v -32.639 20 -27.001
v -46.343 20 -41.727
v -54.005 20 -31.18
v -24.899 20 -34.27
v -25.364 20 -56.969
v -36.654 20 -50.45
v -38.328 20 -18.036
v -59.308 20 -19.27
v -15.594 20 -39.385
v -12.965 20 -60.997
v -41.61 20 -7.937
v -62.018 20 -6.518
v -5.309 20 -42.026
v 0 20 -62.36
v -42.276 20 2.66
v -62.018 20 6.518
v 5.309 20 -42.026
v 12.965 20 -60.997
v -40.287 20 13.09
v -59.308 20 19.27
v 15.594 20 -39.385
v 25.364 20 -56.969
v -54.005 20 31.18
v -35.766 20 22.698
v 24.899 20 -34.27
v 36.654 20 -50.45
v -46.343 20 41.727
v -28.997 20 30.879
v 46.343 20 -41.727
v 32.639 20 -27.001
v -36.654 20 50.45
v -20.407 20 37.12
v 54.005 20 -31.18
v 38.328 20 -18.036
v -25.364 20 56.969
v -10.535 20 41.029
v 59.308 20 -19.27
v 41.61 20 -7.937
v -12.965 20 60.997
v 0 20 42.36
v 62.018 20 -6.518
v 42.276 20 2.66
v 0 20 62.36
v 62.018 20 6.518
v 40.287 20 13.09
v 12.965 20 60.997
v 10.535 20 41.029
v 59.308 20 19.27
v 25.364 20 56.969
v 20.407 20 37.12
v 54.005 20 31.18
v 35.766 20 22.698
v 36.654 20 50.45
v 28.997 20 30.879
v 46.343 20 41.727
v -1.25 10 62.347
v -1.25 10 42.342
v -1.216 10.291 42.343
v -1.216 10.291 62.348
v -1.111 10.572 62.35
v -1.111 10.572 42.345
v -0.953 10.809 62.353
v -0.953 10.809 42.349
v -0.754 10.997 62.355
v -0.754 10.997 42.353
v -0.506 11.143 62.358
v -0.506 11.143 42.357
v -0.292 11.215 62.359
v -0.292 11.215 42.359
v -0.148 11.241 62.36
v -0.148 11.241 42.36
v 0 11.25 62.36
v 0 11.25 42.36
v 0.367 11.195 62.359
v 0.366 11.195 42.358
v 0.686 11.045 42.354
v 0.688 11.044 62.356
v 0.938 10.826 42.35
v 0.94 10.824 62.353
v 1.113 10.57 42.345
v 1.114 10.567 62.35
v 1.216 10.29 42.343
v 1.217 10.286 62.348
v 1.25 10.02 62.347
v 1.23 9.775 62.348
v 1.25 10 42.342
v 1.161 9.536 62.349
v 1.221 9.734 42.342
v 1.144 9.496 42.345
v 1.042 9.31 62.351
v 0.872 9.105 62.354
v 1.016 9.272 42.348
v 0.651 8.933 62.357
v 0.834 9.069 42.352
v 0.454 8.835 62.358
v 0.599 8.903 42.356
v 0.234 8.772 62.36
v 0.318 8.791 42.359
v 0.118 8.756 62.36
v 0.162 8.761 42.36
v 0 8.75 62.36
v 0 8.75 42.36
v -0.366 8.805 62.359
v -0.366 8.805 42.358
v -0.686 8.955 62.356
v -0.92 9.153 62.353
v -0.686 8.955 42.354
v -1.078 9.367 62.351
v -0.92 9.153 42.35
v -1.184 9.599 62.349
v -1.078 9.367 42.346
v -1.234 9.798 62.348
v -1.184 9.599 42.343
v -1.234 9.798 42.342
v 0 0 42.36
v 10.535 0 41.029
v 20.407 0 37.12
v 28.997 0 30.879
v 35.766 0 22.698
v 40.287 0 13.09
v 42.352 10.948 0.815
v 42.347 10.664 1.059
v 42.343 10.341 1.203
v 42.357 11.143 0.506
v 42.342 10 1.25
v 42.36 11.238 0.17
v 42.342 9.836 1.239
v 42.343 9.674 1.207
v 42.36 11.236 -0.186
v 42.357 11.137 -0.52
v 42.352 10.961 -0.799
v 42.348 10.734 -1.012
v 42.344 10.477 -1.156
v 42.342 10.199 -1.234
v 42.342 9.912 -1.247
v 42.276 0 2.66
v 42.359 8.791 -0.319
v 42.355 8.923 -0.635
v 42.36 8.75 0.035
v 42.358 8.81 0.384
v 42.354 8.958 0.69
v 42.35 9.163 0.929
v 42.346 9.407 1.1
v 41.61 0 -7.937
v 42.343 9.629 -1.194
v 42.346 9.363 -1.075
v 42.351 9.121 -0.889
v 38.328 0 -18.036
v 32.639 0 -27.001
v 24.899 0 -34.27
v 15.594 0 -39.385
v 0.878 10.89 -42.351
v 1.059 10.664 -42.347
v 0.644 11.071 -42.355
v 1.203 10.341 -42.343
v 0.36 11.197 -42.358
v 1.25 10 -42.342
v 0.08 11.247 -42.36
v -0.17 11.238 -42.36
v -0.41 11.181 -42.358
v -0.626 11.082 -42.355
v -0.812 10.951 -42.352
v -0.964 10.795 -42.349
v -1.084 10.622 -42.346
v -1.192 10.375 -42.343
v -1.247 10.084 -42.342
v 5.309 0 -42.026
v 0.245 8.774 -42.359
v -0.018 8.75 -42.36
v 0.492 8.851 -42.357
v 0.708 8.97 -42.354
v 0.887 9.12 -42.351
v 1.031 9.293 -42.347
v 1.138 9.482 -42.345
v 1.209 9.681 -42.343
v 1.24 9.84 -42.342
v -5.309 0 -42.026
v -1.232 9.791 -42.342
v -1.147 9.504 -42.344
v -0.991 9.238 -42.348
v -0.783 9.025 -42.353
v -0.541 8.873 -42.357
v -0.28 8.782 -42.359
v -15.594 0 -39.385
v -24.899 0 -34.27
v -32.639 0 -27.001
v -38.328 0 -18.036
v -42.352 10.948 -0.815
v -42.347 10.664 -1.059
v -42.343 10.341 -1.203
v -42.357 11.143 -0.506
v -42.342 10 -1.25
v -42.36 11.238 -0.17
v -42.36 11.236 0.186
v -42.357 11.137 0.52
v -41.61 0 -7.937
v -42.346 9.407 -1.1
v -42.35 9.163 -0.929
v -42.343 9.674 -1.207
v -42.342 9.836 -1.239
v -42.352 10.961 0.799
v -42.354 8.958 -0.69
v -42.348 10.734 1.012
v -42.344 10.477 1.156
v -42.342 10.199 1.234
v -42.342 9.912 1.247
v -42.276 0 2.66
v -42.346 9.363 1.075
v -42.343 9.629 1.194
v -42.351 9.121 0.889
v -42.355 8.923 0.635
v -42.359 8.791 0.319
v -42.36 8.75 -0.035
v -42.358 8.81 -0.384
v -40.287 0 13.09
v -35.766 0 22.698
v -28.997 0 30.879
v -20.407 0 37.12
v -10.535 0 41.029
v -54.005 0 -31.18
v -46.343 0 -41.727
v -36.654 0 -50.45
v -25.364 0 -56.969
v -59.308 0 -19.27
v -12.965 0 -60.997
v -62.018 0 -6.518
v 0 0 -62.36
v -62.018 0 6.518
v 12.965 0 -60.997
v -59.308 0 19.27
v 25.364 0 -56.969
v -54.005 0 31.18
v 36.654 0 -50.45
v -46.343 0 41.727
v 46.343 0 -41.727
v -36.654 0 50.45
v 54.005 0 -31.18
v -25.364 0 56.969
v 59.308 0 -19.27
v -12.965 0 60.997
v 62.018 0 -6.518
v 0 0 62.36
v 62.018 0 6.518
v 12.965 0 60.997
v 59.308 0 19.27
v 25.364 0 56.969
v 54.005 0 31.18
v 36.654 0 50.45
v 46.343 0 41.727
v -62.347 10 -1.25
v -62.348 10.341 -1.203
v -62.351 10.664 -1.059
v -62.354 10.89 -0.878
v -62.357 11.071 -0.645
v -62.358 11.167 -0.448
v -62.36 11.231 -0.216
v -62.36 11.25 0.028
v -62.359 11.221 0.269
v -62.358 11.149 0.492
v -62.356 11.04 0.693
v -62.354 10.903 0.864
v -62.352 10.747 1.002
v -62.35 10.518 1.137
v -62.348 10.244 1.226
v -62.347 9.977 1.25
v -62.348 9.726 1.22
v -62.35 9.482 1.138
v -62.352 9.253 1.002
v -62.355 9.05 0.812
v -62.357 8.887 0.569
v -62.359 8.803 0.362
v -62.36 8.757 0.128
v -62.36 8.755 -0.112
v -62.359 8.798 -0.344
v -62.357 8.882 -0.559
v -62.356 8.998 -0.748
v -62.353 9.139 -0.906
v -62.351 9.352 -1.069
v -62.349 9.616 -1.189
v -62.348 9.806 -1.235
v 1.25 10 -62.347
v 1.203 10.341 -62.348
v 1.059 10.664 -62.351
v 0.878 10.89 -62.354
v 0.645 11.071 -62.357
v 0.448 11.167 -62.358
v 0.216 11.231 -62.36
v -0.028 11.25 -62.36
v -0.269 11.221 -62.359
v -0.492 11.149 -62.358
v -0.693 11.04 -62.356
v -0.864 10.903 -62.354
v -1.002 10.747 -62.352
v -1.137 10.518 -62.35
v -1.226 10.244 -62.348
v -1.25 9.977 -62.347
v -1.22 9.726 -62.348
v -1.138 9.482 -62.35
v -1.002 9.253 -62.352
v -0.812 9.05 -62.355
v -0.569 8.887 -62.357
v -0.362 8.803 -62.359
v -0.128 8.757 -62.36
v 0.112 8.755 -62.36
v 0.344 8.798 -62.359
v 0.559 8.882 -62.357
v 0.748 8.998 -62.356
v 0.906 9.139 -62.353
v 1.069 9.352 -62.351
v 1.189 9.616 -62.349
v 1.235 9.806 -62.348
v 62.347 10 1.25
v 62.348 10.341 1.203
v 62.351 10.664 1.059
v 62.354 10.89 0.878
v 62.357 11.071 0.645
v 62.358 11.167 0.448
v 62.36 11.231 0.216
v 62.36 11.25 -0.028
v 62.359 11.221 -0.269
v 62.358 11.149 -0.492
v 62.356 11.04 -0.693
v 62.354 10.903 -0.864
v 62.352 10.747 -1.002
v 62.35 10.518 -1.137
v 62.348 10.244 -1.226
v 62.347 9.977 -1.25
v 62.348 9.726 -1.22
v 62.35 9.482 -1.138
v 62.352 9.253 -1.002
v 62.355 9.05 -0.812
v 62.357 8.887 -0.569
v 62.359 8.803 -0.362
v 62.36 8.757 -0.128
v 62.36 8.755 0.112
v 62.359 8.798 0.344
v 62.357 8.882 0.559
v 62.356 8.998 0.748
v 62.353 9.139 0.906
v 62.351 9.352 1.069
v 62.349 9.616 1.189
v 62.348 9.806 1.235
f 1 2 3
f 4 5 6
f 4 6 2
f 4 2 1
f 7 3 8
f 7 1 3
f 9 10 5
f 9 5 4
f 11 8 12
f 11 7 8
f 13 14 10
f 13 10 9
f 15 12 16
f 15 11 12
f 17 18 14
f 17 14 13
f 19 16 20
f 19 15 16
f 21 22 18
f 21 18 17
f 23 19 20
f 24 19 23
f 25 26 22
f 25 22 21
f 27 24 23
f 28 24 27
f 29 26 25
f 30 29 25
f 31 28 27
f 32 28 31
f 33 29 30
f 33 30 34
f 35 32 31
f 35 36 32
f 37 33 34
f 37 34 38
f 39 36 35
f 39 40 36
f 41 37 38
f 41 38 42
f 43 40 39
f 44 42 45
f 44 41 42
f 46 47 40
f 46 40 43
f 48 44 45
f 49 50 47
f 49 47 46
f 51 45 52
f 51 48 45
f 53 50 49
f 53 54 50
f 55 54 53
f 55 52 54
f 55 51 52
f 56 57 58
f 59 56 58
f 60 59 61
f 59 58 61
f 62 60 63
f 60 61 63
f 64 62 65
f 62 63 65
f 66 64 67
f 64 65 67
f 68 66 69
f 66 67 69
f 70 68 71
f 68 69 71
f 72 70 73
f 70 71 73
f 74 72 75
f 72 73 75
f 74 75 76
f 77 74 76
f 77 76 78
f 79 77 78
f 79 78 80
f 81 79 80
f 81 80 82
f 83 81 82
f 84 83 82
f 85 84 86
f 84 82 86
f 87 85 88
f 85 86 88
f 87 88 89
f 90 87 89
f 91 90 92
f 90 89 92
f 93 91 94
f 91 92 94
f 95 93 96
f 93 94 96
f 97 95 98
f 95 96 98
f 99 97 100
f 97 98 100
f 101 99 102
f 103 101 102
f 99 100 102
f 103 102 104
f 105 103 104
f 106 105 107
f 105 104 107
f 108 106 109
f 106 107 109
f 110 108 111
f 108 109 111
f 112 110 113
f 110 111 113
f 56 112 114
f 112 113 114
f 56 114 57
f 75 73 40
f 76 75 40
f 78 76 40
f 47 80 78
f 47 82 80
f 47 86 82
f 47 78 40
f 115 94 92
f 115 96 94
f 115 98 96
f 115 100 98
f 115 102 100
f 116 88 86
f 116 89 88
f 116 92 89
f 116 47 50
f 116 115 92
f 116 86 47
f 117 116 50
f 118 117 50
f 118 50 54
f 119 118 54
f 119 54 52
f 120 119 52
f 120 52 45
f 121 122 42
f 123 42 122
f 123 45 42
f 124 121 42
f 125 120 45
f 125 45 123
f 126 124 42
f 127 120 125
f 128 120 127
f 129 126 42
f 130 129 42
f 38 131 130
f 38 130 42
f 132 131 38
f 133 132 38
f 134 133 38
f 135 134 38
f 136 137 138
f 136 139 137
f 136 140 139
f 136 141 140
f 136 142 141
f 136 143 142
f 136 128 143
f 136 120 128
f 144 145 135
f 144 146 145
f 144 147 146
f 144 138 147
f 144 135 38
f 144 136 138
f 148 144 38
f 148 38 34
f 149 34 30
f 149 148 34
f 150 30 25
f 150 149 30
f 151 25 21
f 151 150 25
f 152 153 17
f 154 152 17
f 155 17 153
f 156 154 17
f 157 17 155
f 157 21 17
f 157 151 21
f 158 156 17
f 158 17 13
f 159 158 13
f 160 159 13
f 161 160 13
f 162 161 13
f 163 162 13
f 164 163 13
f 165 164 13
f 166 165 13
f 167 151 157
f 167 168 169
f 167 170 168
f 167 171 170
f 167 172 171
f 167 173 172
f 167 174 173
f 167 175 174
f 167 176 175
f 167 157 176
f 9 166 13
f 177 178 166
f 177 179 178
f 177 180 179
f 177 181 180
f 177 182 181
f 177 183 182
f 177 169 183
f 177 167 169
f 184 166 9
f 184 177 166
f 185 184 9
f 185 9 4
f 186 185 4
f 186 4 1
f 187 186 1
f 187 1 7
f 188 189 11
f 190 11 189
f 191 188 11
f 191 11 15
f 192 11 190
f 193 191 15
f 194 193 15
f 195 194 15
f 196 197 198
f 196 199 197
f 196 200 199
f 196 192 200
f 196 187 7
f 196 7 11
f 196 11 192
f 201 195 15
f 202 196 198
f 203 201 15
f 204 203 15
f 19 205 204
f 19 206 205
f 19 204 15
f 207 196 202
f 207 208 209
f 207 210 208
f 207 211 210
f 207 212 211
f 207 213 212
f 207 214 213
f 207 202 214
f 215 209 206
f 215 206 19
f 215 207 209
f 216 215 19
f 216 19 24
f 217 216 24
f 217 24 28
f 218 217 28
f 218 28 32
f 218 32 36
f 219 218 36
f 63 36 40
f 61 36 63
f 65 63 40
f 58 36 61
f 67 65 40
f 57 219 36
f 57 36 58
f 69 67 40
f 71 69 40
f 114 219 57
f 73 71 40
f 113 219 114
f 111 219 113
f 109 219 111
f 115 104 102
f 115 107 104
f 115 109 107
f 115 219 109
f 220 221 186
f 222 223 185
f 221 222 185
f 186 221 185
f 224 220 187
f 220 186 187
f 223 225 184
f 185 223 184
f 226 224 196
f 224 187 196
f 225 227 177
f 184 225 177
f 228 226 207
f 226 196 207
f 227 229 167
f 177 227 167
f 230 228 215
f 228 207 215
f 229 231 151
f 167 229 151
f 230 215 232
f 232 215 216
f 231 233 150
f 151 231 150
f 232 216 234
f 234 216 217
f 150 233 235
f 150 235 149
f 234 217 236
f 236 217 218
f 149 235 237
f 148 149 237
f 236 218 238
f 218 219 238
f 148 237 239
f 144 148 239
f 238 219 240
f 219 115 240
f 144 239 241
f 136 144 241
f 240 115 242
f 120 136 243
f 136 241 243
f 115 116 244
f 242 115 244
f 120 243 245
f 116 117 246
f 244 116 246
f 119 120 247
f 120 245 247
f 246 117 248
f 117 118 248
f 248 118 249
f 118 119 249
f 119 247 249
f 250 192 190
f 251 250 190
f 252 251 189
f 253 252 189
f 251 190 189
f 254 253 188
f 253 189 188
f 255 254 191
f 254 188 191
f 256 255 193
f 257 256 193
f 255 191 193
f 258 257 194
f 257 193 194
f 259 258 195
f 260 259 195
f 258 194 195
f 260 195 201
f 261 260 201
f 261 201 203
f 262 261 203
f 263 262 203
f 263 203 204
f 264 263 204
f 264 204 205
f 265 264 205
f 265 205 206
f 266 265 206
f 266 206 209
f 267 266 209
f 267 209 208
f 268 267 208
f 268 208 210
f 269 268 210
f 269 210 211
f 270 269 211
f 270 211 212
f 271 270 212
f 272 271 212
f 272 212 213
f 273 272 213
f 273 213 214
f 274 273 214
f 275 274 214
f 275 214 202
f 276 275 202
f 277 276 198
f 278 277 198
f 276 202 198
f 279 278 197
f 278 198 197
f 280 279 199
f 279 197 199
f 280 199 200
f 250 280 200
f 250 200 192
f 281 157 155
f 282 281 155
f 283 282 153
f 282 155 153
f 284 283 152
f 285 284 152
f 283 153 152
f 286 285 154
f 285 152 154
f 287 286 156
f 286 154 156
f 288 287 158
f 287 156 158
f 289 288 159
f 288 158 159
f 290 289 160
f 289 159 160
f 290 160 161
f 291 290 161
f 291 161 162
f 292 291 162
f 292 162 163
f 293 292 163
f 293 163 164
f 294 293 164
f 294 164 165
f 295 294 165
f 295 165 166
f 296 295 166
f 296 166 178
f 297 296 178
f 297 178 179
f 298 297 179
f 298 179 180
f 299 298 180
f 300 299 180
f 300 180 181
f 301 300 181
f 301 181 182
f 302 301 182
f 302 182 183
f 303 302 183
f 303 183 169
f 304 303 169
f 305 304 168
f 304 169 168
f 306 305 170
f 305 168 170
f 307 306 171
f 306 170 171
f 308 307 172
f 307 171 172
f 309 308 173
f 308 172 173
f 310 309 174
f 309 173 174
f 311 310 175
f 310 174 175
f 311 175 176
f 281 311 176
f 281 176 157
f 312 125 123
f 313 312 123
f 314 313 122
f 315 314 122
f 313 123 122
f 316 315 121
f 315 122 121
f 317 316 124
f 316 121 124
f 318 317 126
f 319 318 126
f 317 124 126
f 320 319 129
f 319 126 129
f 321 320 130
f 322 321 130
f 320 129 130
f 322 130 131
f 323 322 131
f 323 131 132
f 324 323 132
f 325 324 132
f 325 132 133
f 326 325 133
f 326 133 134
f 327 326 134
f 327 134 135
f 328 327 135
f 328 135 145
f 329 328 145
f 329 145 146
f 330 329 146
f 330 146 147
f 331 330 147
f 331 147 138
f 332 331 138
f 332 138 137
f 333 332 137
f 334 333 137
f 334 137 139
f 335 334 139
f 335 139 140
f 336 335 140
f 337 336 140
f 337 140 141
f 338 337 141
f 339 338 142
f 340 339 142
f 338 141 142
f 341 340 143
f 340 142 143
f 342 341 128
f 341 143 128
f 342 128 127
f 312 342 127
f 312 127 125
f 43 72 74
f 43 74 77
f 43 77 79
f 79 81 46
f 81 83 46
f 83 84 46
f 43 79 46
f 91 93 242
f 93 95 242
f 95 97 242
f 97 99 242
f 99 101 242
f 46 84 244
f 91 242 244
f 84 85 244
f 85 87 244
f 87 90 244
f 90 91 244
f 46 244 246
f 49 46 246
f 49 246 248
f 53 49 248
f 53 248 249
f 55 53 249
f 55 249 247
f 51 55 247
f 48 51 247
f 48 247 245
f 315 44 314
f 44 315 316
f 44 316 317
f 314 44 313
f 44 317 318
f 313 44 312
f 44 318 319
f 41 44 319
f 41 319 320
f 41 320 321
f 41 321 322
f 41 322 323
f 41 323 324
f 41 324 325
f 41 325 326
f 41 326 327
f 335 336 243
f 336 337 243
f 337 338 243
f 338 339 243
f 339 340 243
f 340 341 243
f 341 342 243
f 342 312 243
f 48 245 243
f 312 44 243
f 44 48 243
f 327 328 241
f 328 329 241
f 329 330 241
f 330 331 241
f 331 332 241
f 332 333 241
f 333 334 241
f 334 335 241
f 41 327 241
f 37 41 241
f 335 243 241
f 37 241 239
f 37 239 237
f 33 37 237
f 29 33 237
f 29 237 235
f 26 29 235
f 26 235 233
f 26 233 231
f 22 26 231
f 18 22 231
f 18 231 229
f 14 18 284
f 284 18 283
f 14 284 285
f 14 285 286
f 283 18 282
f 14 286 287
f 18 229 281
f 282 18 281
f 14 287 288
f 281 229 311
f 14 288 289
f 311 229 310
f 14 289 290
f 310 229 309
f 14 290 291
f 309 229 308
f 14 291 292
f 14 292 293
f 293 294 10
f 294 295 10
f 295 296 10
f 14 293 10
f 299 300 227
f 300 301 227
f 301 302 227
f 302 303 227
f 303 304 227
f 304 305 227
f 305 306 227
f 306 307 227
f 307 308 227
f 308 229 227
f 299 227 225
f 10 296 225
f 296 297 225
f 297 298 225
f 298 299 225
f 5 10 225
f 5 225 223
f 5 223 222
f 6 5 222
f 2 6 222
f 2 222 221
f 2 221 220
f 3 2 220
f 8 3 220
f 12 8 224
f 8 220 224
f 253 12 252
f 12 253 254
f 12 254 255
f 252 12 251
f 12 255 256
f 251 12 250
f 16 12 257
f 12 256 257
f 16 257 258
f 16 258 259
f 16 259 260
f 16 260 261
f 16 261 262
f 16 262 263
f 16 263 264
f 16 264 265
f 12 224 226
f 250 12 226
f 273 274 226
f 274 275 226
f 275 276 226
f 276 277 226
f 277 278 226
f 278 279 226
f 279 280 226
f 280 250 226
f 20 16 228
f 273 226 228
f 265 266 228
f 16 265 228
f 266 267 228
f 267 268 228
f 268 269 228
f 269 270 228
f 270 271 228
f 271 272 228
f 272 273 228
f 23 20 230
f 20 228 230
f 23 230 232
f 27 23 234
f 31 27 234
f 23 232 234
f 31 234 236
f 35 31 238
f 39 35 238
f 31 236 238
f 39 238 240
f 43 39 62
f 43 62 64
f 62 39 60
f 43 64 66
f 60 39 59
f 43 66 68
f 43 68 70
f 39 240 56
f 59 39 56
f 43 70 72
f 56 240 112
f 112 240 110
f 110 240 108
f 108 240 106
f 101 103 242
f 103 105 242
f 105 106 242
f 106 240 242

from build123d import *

# Parameters (mm, degrees)
CROQUIS1_R                 = 62.36
CROQUIS1_R_2               = 42.36
SALIENTE_EXTRUIR1_DEPTH    = 20
CORTAR_EXTRUIR1_REACH      = 92.43
CORTAR_EXTRUIR1_END_RADIUS = 62.36
CROQUIS2_R                 = 1.25
MATRIZC1_COUNT             = 4


with BuildPart() as part:
    # Croquis1 → Saliente-Extruir1 (new body)
    with BuildSketch(Plane(origin=(0, 0, 0), x_dir=(1, 0, 0), z_dir=(0, 1, 0))):
        with Locations(Location((0, 0, 0), (0, 0, 270))):
            Circle(CROQUIS1_R)
        with Locations(Location((0, 0, 0), (0, 0, 270))):
            Circle(CROQUIS1_R_2, mode=Mode.SUBTRACT)
    extrude(amount=SALIENTE_EXTRUIR1_DEPTH)

    # Cortar-Extruir1: up to this cylinder (the profile starts inside it)
    cortar_extruir1_end = Plane(origin=(0, 10, 0), z_dir=(0, -1, 0)) * Cylinder(CORTAR_EXTRUIR1_END_RADIUS, 310.58, mode=Mode.PRIVATE)
    # Croquis2 → Cortar-Extruir1 (cut, up to the surface)
    with BuildSketch(Plane.XY, mode=Mode.PRIVATE) as cortar_extruir1_sk1:
        with Locations((0, 10)):
            Circle(CROQUIS2_R)
    cortar_extruir1_tool1 = extrude(cortar_extruir1_sk1.sketch, amount=-CORTAR_EXTRUIR1_REACH, mode=Mode.PRIVATE) & cortar_extruir1_end
    cortar_extruir1 = cortar_extruir1_tool1.solids().sort_by_distance((0, 10, 0))[0]
    add(cortar_extruir1, mode=Mode.SUBTRACT)

    # MatrizC1: Cortar-Extruir1 ×4 about axis
    matrizc1_axis = Axis((0, 20, 0), (0, 1, 0))
    for i in range(1, MATRIZC1_COUNT):
        add(cortar_extruir1.rotate(matrizc1_axis, i * 360 / MATRIZC1_COUNT), mode=Mode.SUBTRACT)


solid = part.part
